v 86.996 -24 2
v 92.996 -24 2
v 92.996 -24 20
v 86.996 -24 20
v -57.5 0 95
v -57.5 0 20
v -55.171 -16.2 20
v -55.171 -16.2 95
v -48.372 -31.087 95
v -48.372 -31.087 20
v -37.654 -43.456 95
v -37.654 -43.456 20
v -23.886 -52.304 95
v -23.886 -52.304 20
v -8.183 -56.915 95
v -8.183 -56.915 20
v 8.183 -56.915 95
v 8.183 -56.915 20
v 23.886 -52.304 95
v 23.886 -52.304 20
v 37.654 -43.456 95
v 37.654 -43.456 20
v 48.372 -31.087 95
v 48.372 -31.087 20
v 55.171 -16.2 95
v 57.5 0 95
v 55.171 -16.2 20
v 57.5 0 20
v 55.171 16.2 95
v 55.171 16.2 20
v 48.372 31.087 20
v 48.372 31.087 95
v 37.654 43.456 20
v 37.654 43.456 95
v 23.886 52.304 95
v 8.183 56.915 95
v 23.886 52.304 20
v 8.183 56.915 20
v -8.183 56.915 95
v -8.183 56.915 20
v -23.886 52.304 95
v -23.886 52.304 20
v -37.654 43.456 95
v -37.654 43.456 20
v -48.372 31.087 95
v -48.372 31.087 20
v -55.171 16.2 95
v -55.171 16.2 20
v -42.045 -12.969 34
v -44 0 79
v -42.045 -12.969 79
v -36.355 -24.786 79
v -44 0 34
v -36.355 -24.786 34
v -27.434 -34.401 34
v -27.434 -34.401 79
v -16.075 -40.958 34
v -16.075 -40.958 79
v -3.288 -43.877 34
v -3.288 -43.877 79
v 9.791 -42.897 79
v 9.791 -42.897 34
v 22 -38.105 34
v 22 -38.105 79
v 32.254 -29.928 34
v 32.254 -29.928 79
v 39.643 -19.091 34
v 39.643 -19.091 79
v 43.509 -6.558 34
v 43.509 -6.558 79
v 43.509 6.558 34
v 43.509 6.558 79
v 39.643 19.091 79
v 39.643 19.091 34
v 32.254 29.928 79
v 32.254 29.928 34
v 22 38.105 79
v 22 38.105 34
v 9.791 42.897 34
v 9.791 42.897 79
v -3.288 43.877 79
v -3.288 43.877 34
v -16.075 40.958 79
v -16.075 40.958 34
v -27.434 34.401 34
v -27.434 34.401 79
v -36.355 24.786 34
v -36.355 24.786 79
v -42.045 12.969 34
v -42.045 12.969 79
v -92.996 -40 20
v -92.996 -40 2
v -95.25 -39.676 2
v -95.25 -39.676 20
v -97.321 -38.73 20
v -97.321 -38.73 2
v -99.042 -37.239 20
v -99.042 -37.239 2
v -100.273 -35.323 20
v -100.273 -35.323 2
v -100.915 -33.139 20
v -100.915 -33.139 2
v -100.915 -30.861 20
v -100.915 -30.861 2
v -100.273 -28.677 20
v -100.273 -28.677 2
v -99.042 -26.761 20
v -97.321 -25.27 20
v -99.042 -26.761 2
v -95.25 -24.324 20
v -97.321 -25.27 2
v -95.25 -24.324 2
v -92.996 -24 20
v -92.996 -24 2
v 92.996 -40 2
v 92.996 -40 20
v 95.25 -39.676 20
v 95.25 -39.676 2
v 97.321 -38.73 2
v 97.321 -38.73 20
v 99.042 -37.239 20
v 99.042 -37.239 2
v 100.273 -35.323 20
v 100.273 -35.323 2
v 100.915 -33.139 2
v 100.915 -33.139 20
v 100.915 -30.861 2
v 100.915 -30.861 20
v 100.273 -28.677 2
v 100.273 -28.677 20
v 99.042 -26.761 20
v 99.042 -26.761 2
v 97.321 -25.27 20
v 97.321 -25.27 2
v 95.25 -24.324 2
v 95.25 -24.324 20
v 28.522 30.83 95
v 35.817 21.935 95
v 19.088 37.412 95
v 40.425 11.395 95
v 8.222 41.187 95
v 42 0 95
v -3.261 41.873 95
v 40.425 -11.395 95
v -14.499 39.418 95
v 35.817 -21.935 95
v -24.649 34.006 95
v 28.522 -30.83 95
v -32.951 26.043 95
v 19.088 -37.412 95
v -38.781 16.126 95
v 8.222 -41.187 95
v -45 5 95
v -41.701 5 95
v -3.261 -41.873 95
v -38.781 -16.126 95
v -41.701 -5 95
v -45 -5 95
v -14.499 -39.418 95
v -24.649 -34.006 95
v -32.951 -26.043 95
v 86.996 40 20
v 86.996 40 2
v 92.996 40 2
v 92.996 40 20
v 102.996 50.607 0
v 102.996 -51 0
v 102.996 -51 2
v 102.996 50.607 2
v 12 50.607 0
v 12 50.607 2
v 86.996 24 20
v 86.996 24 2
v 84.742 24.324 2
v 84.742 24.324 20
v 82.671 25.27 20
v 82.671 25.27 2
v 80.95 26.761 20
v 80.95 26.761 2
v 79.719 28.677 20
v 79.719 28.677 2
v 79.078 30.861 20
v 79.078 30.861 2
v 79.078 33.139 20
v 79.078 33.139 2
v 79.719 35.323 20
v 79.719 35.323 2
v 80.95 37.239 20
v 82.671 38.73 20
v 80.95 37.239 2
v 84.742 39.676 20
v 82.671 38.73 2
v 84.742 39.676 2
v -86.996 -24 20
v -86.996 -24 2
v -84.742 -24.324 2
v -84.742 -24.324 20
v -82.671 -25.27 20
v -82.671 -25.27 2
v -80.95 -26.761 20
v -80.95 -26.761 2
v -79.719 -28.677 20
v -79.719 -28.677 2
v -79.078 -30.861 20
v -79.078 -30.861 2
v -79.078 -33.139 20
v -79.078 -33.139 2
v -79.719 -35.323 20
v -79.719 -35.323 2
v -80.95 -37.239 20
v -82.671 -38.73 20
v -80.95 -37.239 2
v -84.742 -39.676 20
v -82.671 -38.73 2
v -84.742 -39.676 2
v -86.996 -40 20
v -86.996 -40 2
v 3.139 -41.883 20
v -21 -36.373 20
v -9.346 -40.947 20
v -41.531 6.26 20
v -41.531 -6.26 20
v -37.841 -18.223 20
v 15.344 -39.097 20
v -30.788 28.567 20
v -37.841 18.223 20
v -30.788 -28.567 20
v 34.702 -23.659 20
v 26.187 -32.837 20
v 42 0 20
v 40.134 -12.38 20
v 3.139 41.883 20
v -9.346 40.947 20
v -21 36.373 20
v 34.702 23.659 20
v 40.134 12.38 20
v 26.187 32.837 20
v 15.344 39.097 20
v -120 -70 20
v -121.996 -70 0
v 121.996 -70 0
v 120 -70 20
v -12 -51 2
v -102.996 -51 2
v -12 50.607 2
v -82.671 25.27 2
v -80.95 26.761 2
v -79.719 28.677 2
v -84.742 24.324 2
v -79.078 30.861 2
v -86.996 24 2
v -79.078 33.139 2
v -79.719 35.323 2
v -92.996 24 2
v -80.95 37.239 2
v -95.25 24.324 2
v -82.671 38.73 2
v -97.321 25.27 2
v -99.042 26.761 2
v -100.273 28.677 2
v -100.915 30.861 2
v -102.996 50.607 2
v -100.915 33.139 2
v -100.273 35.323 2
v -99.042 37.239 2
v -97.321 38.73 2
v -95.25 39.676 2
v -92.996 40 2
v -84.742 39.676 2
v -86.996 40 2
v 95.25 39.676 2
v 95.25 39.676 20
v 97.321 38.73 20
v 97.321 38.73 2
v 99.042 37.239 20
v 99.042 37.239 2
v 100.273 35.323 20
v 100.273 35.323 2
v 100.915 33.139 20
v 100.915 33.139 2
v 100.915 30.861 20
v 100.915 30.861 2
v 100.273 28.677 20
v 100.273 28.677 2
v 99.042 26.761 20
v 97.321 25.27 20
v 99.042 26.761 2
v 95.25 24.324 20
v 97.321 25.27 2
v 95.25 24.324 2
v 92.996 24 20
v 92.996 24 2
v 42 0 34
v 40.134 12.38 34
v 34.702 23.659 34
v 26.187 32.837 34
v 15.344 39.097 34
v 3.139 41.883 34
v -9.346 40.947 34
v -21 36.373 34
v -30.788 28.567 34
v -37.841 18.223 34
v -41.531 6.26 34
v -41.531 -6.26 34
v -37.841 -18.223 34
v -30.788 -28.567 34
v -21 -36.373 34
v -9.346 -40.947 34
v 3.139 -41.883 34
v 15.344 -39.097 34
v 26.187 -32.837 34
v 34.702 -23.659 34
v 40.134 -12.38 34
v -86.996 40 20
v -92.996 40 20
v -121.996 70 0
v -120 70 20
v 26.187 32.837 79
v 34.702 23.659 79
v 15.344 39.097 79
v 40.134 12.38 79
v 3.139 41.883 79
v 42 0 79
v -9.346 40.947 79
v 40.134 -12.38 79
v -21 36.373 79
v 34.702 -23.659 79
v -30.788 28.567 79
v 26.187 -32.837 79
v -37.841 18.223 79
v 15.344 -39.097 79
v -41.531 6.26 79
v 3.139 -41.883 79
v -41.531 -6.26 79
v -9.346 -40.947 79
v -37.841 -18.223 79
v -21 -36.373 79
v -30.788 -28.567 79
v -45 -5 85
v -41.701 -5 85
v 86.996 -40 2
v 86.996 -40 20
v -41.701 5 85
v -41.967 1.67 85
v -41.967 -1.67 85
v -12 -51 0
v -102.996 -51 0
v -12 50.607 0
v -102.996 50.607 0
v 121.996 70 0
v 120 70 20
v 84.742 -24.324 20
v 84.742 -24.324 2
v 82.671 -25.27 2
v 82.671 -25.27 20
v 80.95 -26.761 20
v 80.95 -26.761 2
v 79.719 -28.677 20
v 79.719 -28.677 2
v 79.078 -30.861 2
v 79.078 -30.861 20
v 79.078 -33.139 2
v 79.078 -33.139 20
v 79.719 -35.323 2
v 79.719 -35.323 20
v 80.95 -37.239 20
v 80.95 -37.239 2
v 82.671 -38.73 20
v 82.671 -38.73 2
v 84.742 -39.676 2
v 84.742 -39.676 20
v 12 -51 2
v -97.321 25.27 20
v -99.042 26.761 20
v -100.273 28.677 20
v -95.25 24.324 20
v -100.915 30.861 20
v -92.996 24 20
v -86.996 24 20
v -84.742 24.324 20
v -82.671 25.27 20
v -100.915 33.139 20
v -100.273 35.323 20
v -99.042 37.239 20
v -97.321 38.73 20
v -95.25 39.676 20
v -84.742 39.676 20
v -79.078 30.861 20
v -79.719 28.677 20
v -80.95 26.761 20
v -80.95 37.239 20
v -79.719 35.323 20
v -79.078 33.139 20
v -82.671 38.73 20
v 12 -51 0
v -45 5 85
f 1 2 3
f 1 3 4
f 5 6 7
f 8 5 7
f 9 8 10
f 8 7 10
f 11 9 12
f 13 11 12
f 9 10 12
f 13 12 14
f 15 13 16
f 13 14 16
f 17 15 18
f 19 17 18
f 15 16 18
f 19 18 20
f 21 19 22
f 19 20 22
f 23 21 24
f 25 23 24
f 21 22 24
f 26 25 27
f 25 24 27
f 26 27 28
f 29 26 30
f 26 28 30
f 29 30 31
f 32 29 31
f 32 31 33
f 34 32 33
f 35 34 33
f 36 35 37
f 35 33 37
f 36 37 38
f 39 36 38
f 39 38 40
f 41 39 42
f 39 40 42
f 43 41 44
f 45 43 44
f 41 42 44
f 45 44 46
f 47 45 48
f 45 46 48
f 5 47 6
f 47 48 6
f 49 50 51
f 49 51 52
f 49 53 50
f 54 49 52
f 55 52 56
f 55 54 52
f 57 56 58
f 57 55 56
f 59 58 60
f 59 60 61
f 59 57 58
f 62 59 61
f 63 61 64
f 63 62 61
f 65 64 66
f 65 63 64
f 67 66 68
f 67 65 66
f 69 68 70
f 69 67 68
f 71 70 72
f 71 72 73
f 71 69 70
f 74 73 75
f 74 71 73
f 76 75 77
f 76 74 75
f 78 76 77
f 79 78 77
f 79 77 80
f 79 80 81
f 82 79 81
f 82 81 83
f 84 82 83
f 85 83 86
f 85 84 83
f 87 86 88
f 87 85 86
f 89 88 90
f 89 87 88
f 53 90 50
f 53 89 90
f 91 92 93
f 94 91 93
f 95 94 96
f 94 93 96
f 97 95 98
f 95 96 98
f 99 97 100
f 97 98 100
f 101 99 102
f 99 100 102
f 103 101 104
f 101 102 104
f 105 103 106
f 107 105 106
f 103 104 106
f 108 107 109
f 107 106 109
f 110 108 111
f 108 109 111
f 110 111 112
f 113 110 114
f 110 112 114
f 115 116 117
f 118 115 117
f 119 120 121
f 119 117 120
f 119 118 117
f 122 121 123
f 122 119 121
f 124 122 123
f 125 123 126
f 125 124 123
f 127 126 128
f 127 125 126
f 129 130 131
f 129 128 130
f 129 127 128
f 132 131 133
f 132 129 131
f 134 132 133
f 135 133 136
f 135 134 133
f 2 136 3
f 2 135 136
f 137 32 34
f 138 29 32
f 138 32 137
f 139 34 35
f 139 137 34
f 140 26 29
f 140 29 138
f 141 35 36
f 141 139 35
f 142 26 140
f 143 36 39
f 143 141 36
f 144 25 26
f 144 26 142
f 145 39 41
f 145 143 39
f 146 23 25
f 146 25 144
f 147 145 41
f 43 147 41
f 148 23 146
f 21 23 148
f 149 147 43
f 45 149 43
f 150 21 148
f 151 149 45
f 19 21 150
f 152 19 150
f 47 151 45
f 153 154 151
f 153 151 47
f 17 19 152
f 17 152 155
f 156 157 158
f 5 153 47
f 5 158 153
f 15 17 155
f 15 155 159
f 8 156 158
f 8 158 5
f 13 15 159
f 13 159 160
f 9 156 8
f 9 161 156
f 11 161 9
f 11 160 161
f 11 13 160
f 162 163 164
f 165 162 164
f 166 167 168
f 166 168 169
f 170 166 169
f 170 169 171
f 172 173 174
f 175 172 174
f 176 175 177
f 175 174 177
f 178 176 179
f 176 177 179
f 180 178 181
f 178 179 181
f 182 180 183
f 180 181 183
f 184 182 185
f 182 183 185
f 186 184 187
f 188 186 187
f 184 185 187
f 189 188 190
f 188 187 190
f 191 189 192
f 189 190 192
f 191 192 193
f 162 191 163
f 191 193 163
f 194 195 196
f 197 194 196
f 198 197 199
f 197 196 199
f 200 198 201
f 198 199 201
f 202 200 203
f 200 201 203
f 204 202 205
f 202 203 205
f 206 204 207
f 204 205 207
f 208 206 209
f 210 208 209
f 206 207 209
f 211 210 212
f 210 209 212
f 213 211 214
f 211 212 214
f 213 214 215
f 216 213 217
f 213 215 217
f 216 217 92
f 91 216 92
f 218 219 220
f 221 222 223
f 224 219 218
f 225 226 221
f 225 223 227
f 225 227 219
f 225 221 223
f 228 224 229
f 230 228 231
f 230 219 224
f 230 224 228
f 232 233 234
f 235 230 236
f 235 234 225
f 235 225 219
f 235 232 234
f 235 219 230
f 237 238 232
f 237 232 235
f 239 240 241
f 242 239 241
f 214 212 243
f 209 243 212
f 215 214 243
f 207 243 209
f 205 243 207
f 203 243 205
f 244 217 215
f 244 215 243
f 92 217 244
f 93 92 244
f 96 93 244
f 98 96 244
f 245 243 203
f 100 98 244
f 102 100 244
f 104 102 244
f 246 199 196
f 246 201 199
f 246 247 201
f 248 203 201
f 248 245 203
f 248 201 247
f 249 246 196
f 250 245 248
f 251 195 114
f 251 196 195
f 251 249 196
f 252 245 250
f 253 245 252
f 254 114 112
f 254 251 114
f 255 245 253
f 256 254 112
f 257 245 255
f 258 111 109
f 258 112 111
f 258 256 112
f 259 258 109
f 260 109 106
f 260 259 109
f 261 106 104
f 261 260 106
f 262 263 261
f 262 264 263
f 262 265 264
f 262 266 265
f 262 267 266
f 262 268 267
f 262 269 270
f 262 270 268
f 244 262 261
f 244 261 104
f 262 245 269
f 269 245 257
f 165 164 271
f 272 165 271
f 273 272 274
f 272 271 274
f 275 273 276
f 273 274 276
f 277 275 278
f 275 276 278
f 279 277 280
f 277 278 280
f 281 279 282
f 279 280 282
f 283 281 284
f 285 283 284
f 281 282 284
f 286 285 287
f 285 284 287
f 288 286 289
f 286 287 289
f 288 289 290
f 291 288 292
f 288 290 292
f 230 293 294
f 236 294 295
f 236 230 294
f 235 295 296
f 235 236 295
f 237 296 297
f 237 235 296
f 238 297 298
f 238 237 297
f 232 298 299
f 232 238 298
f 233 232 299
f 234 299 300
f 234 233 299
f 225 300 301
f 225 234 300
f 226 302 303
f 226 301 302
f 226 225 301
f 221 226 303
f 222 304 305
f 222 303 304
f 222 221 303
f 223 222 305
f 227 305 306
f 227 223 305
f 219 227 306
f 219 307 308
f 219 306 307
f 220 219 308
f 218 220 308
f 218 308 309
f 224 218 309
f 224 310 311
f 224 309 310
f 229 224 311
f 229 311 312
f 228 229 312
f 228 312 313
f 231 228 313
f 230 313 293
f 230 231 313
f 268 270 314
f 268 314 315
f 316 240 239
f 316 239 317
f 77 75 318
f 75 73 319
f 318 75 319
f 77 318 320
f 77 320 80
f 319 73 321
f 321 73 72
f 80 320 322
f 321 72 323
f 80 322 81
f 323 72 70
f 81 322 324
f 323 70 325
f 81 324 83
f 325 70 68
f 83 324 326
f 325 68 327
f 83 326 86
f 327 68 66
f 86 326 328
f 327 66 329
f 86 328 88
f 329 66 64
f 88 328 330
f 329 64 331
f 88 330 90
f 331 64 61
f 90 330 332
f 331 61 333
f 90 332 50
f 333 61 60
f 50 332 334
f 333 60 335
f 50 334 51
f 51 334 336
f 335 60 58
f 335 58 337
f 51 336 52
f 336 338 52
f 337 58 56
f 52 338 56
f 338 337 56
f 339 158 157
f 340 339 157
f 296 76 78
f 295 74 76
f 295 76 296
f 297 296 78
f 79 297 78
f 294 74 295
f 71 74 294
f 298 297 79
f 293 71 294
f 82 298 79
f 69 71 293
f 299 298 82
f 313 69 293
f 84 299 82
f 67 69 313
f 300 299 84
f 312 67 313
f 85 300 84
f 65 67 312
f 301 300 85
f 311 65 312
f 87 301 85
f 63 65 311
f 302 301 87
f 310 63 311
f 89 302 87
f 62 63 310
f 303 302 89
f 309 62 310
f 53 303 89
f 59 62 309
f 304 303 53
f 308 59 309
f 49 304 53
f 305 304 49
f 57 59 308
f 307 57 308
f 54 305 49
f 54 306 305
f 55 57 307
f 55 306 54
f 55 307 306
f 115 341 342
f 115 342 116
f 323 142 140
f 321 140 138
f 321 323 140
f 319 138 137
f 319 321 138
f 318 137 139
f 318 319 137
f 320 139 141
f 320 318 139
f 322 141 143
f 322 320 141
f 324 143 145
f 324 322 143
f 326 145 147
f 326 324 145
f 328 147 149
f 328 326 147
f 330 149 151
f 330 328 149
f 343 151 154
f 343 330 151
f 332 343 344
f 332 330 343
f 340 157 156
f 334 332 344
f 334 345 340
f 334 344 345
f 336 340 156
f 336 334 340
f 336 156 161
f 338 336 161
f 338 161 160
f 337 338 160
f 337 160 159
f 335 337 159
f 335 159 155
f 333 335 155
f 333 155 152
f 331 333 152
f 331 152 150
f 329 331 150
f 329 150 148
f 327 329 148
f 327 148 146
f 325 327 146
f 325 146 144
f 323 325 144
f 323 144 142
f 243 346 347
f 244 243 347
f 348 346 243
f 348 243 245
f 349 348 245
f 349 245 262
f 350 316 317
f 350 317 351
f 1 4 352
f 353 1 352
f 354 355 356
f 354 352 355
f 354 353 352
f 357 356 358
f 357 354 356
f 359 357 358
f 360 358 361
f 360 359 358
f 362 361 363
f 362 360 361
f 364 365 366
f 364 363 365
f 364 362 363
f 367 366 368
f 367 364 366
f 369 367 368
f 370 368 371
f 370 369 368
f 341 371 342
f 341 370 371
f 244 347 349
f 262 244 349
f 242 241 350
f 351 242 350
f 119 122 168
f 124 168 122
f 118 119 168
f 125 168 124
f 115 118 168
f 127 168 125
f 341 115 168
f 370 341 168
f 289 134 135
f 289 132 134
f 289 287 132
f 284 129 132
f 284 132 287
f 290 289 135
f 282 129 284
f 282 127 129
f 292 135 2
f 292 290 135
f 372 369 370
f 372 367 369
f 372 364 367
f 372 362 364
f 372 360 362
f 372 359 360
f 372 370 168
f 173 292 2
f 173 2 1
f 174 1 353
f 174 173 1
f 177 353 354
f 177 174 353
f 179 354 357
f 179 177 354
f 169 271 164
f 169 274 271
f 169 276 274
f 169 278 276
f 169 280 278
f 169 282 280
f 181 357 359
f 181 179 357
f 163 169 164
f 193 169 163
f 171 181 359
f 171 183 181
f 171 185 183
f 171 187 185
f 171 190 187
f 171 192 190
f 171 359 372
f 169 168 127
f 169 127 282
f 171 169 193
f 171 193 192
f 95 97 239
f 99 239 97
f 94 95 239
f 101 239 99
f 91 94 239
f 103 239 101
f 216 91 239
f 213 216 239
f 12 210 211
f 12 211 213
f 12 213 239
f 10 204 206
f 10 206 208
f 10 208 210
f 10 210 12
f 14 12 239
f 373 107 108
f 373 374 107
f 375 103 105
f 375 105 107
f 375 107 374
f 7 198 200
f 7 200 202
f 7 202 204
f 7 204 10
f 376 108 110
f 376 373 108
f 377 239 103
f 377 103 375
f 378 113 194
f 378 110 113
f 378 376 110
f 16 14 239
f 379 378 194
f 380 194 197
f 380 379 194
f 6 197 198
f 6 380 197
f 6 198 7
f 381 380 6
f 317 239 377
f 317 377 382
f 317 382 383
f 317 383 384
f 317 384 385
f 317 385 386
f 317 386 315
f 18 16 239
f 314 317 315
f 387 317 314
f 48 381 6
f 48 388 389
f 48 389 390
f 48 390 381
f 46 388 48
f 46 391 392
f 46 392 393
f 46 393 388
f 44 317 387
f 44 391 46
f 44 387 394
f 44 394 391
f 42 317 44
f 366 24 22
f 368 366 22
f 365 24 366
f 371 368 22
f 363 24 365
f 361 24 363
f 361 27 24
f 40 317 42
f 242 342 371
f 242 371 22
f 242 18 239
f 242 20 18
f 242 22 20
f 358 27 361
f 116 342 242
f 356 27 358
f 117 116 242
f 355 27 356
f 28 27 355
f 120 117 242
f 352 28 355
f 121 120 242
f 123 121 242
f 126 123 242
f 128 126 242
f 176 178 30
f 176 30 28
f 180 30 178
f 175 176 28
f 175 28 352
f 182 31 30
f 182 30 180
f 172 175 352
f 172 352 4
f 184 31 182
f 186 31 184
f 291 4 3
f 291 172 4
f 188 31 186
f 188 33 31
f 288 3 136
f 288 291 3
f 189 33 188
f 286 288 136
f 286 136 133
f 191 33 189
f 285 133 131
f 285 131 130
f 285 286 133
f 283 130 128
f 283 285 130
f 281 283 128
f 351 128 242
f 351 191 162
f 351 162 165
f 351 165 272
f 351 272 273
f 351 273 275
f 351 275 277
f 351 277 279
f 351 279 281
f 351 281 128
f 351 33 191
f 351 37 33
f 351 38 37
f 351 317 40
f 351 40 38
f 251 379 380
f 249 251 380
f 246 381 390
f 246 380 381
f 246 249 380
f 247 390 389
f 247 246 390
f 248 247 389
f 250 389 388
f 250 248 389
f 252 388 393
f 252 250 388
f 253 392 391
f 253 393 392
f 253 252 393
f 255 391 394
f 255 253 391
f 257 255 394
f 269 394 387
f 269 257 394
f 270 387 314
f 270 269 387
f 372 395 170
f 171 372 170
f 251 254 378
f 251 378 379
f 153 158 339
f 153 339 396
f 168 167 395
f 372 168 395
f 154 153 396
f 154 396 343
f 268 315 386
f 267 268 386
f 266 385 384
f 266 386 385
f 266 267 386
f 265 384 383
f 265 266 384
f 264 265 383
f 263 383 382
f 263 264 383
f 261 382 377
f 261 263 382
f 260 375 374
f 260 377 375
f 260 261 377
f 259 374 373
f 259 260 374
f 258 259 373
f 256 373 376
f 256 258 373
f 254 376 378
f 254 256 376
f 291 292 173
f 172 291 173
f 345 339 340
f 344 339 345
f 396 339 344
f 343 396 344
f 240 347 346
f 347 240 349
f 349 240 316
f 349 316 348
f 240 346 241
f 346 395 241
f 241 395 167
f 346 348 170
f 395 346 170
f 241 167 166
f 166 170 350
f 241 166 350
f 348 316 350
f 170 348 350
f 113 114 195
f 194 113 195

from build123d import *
from OCP.BRepAlgoAPI import BRepAlgoAPI_Cut
from OCP.TopTools import TopTools_ListOfShape

# Parameters (mm, degrees)
SKETCH1_W            = 240
SKETCH1_H            = 140
BOSS_EXTRUDE2_DEPTH  = 20
DRAFT1_ANGLE         = 5.7
SKETCH4_W            = 90.996265389
SKETCH4_H            = 101.607418567
CUT_EXTRUDE1_DEPTH   = 2
CUT_EXTRUDE3_DEPTH   = 52
MIRROR2_COPY_1_DEPTH = 52
MIRROR2_COPY_2_DEPTH = 52
SKETCH6_R            = 57.5
SKETCH6_R_2          = 42
BOSS_EXTRUDE3_DEPTH  = 75
SKETCH7_W            = 6
SKETCH7_H            = 10
CUT_EXTRUDE4_DEPTH   = 10
SKETCH8_W            = 2
SKETCH8_H            = 45


with BuildPart() as part:
    # Sketch1 → Boss-Extrude2 (new body)
    with BuildSketch(Plane.XY):
        Rectangle(SKETCH1_W, SKETCH1_H)
    extrude(amount=BOSS_EXTRUDE2_DEPTH)

    # Draft1
    draft1_faces = [part.faces().sort_by_distance(p)[0] for p in [
        (120, 0, 10),
        (-120, 0, 10),
    ]]
    draft(draft1_faces, Plane.XY.offset(20), DRAFT1_ANGLE)

    # Sketch4 → Cut-Extrude1 (cut)
    with BuildSketch(Plane(origin=(0, 0, 0), x_dir=(-1, 0, 0), z_dir=(0, 0, -1))):
        with Locations((-57.498132695, -0.196290716)):
            Rectangle(SKETCH4_W, SKETCH4_H)
        with Locations((57.498132695, -0.196290716)):
            Rectangle(SKETCH4_W, SKETCH4_H)
    extrude(amount=-CUT_EXTRUDE1_DEPTH, mode=Mode.SUBTRACT)

    # Sketch5 → Cut-Extrude3 (cut)
    with BuildSketch(Plane(origin=(0, 0, 0), x_dir=(-1, 0, 0), z_dir=(0, 0, -1))):
        with BuildLine():
            Line((-92.996265389, 24), (-86.996265389, 24))
            ThreePointArc((-86.996265389, 24), (-78.996265389, 32), (-86.996265389, 40))
            Line((-86.996265389, 40), (-92.996265389, 40))
            ThreePointArc((-92.996265389, 40), (-100.996265389, 32), (-92.996265389, 24))
        make_face()
    cut_extrude3 = extrude(amount=-CUT_EXTRUDE3_DEPTH, mode=Mode.SUBTRACT)

    # Mirror1: Cut-Extrude3 across plane
    add(cut_extrude3.mirror(Plane(origin=(0, 0, 0), x_dir=(0, 0, 1), z_dir=(1, 0, 0))), mode=Mode.SUBTRACT)

    # Mirror2 copy 1 sketch → Mirror2 copy 1 (cut)
    with BuildSketch(Plane(origin=(0, 0, 0), x_dir=(1, 0, 0), z_dir=(0, 0, -1))):
        with BuildLine():
            Line((-92.996265389, 24), (-86.996265389, 24))
            ThreePointArc((-86.996265389, 24), (-78.996265389, 32), (-86.996265389, 40))
            Line((-86.996265389, 40), (-92.996265389, 40))
            ThreePointArc((-92.996265389, 40), (-100.996265389, 32), (-92.996265389, 24))
        make_face()
    extrude(amount=-MIRROR2_COPY_1_DEPTH, mode=Mode.SUBTRACT)

    # Mirror2 copy 2 sketch → Mirror2 copy 2 (cut)
    with BuildSketch(Plane(origin=(0, 0, 0), x_dir=(-1, 0, 0), z_dir=(0, 0, -1))):
        with BuildLine():
            Line((-92.996265389, -24), (-86.996265389, -24))
            ThreePointArc((-86.996265389, -24), (-78.996265389, -32), (-86.996265389, -40))
            Line((-86.996265389, -40), (-92.996265389, -40))
            ThreePointArc((-92.996265389, -40), (-100.996265389, -32), (-92.996265389, -24))
        make_face()
    extrude(amount=-MIRROR2_COPY_2_DEPTH, mode=Mode.SUBTRACT)

    # Sketch6 → Boss-Extrude3 (add)
    with BuildSketch(Plane.XY.offset(20)):
        Circle(SKETCH6_R)
        Circle(SKETCH6_R_2, mode=Mode.SUBTRACT)
    extrude(amount=BOSS_EXTRUDE3_DEPTH)

    # Sketch7 → Cut-Extrude4 (cut)
    with BuildSketch(Plane.XY.offset(95)):
        with Locations((-42, 0)):
            Rectangle(SKETCH7_W, SKETCH7_H)
    extrude(amount=-CUT_EXTRUDE4_DEPTH, mode=Mode.SUBTRACT)


with BuildPart() as cut_revolve1_tool:
    # Sketch8 → Cut-Revolve1 (revolve)
    with BuildSketch(Plane(origin=(0, 0, 0), x_dir=(1, 0, 0), z_dir=(0, 1, 0))):
        with Locations((-43.000000734, -56.5)):
            Rectangle(SKETCH8_W, SKETCH8_H)
    revolve(axis=Axis((0, 0, 0), (0, 0, 1)))


with BuildPart() as part_1:
    add(part.part)

    # Cut-Revolve1: cut by cut_revolve1_tool, with a tolerance
    cut_revolve1_stock = TopTools_ListOfShape()
    cut_revolve1_stock.Append(part_1.part.wrapped)
    cut_revolve1_tools = TopTools_ListOfShape()
    cut_revolve1_tools.Append(cut_revolve1_tool.part.wrapped)
    cut_revolve1_cut = BRepAlgoAPI_Cut()
    cut_revolve1_cut.SetArguments(cut_revolve1_stock)
    cut_revolve1_cut.SetTools(cut_revolve1_tools)
    cut_revolve1_cut.SetFuzzyValue(0.00001)
    cut_revolve1_cut.Build()
    add(Compound.cast(cut_revolve1_cut.Shape()).solids(), mode=Mode.REPLACE)


solid = part_1.part
